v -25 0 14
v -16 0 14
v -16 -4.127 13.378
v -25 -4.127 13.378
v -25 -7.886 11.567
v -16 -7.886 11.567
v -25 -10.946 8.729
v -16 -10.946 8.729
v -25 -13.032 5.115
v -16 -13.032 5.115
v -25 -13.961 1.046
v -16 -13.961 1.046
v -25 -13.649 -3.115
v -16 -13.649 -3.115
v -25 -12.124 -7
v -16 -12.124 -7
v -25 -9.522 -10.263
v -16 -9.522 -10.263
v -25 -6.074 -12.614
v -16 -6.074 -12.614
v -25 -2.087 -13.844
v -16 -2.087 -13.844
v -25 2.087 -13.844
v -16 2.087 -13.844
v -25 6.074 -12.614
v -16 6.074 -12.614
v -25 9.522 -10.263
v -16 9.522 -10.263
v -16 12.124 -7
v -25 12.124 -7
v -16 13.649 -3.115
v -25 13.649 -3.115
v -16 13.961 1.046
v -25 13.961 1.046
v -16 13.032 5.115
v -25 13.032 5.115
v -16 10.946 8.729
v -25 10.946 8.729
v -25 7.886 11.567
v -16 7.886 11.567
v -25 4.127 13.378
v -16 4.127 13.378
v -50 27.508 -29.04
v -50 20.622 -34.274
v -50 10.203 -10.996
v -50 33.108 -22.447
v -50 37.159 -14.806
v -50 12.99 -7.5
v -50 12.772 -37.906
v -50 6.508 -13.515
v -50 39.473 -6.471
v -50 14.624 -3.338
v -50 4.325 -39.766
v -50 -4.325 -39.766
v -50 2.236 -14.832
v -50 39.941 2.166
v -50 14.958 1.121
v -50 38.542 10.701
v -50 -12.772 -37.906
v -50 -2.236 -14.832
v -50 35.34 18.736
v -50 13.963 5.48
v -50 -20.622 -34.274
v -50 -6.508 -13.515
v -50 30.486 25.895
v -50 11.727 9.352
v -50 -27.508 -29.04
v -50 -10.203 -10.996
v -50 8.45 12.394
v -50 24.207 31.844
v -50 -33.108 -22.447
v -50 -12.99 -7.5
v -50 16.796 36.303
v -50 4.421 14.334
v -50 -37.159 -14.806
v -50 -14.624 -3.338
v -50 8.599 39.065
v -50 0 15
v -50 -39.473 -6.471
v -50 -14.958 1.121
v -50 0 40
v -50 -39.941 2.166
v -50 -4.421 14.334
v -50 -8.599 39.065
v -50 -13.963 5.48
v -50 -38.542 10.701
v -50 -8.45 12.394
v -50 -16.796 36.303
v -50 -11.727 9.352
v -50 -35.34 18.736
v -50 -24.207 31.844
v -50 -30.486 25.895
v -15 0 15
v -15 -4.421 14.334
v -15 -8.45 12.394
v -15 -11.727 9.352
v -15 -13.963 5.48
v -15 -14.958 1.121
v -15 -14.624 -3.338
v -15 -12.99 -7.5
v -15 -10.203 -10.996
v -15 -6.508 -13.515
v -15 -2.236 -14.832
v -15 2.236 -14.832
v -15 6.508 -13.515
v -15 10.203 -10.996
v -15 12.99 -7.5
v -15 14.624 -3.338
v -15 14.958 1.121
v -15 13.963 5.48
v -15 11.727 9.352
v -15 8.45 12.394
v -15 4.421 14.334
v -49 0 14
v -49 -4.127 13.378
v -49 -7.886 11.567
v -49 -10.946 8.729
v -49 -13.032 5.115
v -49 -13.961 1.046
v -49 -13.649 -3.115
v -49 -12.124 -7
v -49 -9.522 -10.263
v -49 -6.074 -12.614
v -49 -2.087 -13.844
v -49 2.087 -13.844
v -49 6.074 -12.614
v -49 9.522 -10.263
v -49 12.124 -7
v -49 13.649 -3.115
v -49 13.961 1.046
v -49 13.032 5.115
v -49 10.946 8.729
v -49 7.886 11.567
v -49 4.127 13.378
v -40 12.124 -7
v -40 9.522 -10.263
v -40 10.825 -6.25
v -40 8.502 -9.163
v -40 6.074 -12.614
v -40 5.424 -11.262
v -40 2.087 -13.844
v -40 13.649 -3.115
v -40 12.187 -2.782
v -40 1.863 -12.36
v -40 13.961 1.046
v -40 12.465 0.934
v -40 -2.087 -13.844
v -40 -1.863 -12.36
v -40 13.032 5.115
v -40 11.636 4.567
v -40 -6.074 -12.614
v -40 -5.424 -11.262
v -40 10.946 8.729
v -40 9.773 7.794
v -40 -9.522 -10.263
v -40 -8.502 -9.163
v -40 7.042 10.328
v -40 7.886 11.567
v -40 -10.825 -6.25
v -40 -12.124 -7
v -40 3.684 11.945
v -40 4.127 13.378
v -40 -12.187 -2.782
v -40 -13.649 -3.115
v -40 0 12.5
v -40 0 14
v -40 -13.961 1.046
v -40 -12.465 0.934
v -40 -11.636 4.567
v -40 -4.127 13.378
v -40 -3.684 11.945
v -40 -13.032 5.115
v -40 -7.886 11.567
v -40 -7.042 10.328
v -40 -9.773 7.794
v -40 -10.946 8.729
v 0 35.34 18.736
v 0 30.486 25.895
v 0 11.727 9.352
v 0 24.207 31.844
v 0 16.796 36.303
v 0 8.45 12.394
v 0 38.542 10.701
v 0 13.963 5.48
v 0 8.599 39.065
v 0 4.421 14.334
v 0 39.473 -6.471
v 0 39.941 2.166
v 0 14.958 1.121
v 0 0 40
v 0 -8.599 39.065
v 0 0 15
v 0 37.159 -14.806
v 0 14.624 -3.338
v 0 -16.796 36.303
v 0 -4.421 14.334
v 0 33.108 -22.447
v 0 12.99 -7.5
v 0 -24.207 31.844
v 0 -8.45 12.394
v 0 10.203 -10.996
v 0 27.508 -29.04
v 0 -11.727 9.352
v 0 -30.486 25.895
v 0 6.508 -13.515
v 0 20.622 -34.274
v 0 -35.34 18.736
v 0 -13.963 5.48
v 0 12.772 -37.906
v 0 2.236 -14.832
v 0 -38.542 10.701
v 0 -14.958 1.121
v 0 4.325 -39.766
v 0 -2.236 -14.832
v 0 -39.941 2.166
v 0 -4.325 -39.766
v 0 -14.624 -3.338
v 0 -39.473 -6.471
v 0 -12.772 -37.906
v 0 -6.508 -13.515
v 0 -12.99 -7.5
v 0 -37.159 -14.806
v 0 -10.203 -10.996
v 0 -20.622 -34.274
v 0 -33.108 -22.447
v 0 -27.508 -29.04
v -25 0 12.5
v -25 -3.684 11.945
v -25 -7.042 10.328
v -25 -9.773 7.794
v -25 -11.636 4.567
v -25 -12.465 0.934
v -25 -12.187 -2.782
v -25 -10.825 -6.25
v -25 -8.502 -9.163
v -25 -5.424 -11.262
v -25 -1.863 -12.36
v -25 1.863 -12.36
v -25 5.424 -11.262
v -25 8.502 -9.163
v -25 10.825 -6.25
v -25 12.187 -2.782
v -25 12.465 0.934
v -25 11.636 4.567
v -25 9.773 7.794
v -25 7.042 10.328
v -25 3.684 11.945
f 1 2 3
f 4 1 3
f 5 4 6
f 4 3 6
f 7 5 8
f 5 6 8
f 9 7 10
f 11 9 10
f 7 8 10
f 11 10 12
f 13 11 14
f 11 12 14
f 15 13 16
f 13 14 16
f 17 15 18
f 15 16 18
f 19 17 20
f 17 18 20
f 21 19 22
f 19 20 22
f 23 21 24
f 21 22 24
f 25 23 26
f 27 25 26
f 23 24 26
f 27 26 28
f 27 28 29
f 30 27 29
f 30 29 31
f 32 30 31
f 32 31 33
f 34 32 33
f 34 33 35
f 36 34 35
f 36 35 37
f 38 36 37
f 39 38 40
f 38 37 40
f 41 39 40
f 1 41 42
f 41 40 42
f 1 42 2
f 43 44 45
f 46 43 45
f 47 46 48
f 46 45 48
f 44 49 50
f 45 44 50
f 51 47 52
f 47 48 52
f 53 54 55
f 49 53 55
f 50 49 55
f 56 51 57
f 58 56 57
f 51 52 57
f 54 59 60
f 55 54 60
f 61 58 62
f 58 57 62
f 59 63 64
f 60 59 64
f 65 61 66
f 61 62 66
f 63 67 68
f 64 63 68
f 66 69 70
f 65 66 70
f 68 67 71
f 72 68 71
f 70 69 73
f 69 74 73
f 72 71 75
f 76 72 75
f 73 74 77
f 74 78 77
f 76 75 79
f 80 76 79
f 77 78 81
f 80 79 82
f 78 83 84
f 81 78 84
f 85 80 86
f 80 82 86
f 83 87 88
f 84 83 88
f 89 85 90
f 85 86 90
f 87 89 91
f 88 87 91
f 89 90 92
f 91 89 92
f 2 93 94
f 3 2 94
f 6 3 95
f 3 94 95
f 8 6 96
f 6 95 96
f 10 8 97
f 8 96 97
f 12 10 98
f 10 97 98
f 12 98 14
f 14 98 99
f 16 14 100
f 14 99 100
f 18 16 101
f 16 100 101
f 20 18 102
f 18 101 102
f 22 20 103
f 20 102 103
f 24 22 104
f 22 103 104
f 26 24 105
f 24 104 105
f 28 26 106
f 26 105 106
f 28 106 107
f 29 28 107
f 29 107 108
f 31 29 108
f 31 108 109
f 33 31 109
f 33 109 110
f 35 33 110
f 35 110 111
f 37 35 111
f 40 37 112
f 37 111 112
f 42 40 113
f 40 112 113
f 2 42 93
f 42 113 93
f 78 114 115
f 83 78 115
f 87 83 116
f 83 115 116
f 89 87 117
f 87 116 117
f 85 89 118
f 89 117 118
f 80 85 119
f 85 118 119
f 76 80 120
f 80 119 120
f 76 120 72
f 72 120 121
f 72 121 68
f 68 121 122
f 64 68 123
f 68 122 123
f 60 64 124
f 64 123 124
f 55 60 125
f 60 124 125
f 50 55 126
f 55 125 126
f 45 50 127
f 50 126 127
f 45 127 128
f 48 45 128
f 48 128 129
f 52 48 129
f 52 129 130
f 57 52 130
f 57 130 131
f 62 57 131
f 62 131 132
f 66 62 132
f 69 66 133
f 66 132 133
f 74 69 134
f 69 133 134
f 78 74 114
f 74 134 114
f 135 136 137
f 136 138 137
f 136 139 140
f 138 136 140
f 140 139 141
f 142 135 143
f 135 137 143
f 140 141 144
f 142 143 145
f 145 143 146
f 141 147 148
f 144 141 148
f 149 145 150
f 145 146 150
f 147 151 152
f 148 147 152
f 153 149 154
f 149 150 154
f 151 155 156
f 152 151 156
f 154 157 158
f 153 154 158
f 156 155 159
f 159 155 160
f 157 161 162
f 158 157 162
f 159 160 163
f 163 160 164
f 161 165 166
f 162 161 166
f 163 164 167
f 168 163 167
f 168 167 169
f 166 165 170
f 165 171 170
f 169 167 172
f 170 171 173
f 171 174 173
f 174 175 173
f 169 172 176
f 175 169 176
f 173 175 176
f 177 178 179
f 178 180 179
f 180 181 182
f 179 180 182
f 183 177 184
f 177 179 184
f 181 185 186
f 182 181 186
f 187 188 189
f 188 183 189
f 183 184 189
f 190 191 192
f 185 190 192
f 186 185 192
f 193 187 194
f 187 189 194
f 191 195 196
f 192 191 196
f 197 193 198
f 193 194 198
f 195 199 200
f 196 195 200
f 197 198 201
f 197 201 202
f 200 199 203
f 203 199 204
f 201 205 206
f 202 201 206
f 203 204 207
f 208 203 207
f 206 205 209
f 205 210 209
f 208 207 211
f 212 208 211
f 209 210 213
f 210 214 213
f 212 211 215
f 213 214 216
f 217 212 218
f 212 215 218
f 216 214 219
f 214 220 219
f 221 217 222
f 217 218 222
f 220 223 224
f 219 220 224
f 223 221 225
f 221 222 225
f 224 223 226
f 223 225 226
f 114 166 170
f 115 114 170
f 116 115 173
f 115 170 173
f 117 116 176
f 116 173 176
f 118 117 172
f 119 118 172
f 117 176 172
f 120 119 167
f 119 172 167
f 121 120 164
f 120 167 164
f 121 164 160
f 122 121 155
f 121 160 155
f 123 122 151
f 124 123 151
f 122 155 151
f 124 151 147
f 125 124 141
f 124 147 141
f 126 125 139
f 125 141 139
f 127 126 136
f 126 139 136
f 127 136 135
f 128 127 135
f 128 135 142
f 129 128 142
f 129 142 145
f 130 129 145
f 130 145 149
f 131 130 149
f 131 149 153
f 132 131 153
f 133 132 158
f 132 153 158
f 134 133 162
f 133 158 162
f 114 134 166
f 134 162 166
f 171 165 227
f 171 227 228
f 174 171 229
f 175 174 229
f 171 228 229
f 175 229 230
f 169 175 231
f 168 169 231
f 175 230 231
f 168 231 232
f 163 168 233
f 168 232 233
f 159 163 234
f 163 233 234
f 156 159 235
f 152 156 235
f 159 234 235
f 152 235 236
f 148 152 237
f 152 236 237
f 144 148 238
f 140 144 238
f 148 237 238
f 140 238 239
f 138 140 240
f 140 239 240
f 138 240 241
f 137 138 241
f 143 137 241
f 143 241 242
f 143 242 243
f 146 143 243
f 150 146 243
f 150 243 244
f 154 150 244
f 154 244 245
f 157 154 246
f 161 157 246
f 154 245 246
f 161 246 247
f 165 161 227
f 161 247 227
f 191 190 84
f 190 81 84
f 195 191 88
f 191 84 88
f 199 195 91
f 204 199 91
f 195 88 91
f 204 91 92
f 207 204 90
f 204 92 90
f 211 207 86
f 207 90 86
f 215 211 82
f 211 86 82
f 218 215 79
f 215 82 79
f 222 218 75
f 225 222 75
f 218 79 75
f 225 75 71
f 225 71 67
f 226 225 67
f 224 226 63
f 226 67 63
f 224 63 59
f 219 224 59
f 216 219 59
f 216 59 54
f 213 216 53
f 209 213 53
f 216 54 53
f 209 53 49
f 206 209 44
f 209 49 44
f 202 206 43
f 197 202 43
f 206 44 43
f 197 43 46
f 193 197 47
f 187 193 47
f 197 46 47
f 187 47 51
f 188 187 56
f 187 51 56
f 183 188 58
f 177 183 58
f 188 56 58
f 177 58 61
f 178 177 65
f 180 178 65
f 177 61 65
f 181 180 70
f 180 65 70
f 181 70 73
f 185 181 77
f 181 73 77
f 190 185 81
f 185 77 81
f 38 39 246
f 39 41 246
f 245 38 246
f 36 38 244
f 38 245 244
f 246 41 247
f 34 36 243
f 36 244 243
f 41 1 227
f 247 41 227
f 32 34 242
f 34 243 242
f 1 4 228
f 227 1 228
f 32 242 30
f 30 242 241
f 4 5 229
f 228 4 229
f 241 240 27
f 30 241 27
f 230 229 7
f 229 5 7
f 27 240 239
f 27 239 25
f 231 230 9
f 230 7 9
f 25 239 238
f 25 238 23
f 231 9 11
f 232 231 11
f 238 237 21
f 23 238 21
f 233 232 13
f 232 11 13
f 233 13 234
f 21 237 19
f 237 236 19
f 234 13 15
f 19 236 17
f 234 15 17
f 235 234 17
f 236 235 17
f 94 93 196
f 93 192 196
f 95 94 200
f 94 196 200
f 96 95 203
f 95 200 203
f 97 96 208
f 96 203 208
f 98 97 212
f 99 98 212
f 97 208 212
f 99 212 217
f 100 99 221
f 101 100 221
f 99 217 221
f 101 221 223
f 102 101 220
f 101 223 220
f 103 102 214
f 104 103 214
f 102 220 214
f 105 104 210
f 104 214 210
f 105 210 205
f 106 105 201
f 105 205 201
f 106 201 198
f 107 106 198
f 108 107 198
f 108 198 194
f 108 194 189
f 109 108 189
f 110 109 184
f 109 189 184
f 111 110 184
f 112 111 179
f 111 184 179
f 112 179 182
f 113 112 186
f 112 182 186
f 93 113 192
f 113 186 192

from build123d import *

# Parameters (mm, degrees)
F0_W    = 40
F0_H    = 15
F2_SIZE = 0.99999


# Not quite as in the source:
# - a fillet or chamfer is up to 0.001 mm smaller than in the source, because OpenCascade refuses the exact size


with BuildPart() as f1:
    # F0 (on Front) → F1 (revolve)
    with BuildSketch(Plane.XZ):
        Polygon((-45, 40), (-50, 40), (-50, 14), (-40, 14), (-40, 12.5), (-25, 12.5), (-25, 14), (-15, 14), (-15, 15), (0, 15), (0, 40), (-5, 40), (-5, 25), (-45, 25), align=None)
        with Locations((-25, 32.5)):
            Rectangle(F0_W, F0_H)
    revolve(axis=Axis((-17.5871104002, 0, 0), (1, 0, 0)))

    # F2 (size 1 in the source; OpenCascade refuses exactly that, so slightly less here)
    f2_edges = [f1.edges().sort_by_distance(p)[0] for p in [
        (-15, 0, -14),
        (-50, 0, -14),
    ]]
    chamfer(f2_edges, length=F2_SIZE)


solid = f1.part
